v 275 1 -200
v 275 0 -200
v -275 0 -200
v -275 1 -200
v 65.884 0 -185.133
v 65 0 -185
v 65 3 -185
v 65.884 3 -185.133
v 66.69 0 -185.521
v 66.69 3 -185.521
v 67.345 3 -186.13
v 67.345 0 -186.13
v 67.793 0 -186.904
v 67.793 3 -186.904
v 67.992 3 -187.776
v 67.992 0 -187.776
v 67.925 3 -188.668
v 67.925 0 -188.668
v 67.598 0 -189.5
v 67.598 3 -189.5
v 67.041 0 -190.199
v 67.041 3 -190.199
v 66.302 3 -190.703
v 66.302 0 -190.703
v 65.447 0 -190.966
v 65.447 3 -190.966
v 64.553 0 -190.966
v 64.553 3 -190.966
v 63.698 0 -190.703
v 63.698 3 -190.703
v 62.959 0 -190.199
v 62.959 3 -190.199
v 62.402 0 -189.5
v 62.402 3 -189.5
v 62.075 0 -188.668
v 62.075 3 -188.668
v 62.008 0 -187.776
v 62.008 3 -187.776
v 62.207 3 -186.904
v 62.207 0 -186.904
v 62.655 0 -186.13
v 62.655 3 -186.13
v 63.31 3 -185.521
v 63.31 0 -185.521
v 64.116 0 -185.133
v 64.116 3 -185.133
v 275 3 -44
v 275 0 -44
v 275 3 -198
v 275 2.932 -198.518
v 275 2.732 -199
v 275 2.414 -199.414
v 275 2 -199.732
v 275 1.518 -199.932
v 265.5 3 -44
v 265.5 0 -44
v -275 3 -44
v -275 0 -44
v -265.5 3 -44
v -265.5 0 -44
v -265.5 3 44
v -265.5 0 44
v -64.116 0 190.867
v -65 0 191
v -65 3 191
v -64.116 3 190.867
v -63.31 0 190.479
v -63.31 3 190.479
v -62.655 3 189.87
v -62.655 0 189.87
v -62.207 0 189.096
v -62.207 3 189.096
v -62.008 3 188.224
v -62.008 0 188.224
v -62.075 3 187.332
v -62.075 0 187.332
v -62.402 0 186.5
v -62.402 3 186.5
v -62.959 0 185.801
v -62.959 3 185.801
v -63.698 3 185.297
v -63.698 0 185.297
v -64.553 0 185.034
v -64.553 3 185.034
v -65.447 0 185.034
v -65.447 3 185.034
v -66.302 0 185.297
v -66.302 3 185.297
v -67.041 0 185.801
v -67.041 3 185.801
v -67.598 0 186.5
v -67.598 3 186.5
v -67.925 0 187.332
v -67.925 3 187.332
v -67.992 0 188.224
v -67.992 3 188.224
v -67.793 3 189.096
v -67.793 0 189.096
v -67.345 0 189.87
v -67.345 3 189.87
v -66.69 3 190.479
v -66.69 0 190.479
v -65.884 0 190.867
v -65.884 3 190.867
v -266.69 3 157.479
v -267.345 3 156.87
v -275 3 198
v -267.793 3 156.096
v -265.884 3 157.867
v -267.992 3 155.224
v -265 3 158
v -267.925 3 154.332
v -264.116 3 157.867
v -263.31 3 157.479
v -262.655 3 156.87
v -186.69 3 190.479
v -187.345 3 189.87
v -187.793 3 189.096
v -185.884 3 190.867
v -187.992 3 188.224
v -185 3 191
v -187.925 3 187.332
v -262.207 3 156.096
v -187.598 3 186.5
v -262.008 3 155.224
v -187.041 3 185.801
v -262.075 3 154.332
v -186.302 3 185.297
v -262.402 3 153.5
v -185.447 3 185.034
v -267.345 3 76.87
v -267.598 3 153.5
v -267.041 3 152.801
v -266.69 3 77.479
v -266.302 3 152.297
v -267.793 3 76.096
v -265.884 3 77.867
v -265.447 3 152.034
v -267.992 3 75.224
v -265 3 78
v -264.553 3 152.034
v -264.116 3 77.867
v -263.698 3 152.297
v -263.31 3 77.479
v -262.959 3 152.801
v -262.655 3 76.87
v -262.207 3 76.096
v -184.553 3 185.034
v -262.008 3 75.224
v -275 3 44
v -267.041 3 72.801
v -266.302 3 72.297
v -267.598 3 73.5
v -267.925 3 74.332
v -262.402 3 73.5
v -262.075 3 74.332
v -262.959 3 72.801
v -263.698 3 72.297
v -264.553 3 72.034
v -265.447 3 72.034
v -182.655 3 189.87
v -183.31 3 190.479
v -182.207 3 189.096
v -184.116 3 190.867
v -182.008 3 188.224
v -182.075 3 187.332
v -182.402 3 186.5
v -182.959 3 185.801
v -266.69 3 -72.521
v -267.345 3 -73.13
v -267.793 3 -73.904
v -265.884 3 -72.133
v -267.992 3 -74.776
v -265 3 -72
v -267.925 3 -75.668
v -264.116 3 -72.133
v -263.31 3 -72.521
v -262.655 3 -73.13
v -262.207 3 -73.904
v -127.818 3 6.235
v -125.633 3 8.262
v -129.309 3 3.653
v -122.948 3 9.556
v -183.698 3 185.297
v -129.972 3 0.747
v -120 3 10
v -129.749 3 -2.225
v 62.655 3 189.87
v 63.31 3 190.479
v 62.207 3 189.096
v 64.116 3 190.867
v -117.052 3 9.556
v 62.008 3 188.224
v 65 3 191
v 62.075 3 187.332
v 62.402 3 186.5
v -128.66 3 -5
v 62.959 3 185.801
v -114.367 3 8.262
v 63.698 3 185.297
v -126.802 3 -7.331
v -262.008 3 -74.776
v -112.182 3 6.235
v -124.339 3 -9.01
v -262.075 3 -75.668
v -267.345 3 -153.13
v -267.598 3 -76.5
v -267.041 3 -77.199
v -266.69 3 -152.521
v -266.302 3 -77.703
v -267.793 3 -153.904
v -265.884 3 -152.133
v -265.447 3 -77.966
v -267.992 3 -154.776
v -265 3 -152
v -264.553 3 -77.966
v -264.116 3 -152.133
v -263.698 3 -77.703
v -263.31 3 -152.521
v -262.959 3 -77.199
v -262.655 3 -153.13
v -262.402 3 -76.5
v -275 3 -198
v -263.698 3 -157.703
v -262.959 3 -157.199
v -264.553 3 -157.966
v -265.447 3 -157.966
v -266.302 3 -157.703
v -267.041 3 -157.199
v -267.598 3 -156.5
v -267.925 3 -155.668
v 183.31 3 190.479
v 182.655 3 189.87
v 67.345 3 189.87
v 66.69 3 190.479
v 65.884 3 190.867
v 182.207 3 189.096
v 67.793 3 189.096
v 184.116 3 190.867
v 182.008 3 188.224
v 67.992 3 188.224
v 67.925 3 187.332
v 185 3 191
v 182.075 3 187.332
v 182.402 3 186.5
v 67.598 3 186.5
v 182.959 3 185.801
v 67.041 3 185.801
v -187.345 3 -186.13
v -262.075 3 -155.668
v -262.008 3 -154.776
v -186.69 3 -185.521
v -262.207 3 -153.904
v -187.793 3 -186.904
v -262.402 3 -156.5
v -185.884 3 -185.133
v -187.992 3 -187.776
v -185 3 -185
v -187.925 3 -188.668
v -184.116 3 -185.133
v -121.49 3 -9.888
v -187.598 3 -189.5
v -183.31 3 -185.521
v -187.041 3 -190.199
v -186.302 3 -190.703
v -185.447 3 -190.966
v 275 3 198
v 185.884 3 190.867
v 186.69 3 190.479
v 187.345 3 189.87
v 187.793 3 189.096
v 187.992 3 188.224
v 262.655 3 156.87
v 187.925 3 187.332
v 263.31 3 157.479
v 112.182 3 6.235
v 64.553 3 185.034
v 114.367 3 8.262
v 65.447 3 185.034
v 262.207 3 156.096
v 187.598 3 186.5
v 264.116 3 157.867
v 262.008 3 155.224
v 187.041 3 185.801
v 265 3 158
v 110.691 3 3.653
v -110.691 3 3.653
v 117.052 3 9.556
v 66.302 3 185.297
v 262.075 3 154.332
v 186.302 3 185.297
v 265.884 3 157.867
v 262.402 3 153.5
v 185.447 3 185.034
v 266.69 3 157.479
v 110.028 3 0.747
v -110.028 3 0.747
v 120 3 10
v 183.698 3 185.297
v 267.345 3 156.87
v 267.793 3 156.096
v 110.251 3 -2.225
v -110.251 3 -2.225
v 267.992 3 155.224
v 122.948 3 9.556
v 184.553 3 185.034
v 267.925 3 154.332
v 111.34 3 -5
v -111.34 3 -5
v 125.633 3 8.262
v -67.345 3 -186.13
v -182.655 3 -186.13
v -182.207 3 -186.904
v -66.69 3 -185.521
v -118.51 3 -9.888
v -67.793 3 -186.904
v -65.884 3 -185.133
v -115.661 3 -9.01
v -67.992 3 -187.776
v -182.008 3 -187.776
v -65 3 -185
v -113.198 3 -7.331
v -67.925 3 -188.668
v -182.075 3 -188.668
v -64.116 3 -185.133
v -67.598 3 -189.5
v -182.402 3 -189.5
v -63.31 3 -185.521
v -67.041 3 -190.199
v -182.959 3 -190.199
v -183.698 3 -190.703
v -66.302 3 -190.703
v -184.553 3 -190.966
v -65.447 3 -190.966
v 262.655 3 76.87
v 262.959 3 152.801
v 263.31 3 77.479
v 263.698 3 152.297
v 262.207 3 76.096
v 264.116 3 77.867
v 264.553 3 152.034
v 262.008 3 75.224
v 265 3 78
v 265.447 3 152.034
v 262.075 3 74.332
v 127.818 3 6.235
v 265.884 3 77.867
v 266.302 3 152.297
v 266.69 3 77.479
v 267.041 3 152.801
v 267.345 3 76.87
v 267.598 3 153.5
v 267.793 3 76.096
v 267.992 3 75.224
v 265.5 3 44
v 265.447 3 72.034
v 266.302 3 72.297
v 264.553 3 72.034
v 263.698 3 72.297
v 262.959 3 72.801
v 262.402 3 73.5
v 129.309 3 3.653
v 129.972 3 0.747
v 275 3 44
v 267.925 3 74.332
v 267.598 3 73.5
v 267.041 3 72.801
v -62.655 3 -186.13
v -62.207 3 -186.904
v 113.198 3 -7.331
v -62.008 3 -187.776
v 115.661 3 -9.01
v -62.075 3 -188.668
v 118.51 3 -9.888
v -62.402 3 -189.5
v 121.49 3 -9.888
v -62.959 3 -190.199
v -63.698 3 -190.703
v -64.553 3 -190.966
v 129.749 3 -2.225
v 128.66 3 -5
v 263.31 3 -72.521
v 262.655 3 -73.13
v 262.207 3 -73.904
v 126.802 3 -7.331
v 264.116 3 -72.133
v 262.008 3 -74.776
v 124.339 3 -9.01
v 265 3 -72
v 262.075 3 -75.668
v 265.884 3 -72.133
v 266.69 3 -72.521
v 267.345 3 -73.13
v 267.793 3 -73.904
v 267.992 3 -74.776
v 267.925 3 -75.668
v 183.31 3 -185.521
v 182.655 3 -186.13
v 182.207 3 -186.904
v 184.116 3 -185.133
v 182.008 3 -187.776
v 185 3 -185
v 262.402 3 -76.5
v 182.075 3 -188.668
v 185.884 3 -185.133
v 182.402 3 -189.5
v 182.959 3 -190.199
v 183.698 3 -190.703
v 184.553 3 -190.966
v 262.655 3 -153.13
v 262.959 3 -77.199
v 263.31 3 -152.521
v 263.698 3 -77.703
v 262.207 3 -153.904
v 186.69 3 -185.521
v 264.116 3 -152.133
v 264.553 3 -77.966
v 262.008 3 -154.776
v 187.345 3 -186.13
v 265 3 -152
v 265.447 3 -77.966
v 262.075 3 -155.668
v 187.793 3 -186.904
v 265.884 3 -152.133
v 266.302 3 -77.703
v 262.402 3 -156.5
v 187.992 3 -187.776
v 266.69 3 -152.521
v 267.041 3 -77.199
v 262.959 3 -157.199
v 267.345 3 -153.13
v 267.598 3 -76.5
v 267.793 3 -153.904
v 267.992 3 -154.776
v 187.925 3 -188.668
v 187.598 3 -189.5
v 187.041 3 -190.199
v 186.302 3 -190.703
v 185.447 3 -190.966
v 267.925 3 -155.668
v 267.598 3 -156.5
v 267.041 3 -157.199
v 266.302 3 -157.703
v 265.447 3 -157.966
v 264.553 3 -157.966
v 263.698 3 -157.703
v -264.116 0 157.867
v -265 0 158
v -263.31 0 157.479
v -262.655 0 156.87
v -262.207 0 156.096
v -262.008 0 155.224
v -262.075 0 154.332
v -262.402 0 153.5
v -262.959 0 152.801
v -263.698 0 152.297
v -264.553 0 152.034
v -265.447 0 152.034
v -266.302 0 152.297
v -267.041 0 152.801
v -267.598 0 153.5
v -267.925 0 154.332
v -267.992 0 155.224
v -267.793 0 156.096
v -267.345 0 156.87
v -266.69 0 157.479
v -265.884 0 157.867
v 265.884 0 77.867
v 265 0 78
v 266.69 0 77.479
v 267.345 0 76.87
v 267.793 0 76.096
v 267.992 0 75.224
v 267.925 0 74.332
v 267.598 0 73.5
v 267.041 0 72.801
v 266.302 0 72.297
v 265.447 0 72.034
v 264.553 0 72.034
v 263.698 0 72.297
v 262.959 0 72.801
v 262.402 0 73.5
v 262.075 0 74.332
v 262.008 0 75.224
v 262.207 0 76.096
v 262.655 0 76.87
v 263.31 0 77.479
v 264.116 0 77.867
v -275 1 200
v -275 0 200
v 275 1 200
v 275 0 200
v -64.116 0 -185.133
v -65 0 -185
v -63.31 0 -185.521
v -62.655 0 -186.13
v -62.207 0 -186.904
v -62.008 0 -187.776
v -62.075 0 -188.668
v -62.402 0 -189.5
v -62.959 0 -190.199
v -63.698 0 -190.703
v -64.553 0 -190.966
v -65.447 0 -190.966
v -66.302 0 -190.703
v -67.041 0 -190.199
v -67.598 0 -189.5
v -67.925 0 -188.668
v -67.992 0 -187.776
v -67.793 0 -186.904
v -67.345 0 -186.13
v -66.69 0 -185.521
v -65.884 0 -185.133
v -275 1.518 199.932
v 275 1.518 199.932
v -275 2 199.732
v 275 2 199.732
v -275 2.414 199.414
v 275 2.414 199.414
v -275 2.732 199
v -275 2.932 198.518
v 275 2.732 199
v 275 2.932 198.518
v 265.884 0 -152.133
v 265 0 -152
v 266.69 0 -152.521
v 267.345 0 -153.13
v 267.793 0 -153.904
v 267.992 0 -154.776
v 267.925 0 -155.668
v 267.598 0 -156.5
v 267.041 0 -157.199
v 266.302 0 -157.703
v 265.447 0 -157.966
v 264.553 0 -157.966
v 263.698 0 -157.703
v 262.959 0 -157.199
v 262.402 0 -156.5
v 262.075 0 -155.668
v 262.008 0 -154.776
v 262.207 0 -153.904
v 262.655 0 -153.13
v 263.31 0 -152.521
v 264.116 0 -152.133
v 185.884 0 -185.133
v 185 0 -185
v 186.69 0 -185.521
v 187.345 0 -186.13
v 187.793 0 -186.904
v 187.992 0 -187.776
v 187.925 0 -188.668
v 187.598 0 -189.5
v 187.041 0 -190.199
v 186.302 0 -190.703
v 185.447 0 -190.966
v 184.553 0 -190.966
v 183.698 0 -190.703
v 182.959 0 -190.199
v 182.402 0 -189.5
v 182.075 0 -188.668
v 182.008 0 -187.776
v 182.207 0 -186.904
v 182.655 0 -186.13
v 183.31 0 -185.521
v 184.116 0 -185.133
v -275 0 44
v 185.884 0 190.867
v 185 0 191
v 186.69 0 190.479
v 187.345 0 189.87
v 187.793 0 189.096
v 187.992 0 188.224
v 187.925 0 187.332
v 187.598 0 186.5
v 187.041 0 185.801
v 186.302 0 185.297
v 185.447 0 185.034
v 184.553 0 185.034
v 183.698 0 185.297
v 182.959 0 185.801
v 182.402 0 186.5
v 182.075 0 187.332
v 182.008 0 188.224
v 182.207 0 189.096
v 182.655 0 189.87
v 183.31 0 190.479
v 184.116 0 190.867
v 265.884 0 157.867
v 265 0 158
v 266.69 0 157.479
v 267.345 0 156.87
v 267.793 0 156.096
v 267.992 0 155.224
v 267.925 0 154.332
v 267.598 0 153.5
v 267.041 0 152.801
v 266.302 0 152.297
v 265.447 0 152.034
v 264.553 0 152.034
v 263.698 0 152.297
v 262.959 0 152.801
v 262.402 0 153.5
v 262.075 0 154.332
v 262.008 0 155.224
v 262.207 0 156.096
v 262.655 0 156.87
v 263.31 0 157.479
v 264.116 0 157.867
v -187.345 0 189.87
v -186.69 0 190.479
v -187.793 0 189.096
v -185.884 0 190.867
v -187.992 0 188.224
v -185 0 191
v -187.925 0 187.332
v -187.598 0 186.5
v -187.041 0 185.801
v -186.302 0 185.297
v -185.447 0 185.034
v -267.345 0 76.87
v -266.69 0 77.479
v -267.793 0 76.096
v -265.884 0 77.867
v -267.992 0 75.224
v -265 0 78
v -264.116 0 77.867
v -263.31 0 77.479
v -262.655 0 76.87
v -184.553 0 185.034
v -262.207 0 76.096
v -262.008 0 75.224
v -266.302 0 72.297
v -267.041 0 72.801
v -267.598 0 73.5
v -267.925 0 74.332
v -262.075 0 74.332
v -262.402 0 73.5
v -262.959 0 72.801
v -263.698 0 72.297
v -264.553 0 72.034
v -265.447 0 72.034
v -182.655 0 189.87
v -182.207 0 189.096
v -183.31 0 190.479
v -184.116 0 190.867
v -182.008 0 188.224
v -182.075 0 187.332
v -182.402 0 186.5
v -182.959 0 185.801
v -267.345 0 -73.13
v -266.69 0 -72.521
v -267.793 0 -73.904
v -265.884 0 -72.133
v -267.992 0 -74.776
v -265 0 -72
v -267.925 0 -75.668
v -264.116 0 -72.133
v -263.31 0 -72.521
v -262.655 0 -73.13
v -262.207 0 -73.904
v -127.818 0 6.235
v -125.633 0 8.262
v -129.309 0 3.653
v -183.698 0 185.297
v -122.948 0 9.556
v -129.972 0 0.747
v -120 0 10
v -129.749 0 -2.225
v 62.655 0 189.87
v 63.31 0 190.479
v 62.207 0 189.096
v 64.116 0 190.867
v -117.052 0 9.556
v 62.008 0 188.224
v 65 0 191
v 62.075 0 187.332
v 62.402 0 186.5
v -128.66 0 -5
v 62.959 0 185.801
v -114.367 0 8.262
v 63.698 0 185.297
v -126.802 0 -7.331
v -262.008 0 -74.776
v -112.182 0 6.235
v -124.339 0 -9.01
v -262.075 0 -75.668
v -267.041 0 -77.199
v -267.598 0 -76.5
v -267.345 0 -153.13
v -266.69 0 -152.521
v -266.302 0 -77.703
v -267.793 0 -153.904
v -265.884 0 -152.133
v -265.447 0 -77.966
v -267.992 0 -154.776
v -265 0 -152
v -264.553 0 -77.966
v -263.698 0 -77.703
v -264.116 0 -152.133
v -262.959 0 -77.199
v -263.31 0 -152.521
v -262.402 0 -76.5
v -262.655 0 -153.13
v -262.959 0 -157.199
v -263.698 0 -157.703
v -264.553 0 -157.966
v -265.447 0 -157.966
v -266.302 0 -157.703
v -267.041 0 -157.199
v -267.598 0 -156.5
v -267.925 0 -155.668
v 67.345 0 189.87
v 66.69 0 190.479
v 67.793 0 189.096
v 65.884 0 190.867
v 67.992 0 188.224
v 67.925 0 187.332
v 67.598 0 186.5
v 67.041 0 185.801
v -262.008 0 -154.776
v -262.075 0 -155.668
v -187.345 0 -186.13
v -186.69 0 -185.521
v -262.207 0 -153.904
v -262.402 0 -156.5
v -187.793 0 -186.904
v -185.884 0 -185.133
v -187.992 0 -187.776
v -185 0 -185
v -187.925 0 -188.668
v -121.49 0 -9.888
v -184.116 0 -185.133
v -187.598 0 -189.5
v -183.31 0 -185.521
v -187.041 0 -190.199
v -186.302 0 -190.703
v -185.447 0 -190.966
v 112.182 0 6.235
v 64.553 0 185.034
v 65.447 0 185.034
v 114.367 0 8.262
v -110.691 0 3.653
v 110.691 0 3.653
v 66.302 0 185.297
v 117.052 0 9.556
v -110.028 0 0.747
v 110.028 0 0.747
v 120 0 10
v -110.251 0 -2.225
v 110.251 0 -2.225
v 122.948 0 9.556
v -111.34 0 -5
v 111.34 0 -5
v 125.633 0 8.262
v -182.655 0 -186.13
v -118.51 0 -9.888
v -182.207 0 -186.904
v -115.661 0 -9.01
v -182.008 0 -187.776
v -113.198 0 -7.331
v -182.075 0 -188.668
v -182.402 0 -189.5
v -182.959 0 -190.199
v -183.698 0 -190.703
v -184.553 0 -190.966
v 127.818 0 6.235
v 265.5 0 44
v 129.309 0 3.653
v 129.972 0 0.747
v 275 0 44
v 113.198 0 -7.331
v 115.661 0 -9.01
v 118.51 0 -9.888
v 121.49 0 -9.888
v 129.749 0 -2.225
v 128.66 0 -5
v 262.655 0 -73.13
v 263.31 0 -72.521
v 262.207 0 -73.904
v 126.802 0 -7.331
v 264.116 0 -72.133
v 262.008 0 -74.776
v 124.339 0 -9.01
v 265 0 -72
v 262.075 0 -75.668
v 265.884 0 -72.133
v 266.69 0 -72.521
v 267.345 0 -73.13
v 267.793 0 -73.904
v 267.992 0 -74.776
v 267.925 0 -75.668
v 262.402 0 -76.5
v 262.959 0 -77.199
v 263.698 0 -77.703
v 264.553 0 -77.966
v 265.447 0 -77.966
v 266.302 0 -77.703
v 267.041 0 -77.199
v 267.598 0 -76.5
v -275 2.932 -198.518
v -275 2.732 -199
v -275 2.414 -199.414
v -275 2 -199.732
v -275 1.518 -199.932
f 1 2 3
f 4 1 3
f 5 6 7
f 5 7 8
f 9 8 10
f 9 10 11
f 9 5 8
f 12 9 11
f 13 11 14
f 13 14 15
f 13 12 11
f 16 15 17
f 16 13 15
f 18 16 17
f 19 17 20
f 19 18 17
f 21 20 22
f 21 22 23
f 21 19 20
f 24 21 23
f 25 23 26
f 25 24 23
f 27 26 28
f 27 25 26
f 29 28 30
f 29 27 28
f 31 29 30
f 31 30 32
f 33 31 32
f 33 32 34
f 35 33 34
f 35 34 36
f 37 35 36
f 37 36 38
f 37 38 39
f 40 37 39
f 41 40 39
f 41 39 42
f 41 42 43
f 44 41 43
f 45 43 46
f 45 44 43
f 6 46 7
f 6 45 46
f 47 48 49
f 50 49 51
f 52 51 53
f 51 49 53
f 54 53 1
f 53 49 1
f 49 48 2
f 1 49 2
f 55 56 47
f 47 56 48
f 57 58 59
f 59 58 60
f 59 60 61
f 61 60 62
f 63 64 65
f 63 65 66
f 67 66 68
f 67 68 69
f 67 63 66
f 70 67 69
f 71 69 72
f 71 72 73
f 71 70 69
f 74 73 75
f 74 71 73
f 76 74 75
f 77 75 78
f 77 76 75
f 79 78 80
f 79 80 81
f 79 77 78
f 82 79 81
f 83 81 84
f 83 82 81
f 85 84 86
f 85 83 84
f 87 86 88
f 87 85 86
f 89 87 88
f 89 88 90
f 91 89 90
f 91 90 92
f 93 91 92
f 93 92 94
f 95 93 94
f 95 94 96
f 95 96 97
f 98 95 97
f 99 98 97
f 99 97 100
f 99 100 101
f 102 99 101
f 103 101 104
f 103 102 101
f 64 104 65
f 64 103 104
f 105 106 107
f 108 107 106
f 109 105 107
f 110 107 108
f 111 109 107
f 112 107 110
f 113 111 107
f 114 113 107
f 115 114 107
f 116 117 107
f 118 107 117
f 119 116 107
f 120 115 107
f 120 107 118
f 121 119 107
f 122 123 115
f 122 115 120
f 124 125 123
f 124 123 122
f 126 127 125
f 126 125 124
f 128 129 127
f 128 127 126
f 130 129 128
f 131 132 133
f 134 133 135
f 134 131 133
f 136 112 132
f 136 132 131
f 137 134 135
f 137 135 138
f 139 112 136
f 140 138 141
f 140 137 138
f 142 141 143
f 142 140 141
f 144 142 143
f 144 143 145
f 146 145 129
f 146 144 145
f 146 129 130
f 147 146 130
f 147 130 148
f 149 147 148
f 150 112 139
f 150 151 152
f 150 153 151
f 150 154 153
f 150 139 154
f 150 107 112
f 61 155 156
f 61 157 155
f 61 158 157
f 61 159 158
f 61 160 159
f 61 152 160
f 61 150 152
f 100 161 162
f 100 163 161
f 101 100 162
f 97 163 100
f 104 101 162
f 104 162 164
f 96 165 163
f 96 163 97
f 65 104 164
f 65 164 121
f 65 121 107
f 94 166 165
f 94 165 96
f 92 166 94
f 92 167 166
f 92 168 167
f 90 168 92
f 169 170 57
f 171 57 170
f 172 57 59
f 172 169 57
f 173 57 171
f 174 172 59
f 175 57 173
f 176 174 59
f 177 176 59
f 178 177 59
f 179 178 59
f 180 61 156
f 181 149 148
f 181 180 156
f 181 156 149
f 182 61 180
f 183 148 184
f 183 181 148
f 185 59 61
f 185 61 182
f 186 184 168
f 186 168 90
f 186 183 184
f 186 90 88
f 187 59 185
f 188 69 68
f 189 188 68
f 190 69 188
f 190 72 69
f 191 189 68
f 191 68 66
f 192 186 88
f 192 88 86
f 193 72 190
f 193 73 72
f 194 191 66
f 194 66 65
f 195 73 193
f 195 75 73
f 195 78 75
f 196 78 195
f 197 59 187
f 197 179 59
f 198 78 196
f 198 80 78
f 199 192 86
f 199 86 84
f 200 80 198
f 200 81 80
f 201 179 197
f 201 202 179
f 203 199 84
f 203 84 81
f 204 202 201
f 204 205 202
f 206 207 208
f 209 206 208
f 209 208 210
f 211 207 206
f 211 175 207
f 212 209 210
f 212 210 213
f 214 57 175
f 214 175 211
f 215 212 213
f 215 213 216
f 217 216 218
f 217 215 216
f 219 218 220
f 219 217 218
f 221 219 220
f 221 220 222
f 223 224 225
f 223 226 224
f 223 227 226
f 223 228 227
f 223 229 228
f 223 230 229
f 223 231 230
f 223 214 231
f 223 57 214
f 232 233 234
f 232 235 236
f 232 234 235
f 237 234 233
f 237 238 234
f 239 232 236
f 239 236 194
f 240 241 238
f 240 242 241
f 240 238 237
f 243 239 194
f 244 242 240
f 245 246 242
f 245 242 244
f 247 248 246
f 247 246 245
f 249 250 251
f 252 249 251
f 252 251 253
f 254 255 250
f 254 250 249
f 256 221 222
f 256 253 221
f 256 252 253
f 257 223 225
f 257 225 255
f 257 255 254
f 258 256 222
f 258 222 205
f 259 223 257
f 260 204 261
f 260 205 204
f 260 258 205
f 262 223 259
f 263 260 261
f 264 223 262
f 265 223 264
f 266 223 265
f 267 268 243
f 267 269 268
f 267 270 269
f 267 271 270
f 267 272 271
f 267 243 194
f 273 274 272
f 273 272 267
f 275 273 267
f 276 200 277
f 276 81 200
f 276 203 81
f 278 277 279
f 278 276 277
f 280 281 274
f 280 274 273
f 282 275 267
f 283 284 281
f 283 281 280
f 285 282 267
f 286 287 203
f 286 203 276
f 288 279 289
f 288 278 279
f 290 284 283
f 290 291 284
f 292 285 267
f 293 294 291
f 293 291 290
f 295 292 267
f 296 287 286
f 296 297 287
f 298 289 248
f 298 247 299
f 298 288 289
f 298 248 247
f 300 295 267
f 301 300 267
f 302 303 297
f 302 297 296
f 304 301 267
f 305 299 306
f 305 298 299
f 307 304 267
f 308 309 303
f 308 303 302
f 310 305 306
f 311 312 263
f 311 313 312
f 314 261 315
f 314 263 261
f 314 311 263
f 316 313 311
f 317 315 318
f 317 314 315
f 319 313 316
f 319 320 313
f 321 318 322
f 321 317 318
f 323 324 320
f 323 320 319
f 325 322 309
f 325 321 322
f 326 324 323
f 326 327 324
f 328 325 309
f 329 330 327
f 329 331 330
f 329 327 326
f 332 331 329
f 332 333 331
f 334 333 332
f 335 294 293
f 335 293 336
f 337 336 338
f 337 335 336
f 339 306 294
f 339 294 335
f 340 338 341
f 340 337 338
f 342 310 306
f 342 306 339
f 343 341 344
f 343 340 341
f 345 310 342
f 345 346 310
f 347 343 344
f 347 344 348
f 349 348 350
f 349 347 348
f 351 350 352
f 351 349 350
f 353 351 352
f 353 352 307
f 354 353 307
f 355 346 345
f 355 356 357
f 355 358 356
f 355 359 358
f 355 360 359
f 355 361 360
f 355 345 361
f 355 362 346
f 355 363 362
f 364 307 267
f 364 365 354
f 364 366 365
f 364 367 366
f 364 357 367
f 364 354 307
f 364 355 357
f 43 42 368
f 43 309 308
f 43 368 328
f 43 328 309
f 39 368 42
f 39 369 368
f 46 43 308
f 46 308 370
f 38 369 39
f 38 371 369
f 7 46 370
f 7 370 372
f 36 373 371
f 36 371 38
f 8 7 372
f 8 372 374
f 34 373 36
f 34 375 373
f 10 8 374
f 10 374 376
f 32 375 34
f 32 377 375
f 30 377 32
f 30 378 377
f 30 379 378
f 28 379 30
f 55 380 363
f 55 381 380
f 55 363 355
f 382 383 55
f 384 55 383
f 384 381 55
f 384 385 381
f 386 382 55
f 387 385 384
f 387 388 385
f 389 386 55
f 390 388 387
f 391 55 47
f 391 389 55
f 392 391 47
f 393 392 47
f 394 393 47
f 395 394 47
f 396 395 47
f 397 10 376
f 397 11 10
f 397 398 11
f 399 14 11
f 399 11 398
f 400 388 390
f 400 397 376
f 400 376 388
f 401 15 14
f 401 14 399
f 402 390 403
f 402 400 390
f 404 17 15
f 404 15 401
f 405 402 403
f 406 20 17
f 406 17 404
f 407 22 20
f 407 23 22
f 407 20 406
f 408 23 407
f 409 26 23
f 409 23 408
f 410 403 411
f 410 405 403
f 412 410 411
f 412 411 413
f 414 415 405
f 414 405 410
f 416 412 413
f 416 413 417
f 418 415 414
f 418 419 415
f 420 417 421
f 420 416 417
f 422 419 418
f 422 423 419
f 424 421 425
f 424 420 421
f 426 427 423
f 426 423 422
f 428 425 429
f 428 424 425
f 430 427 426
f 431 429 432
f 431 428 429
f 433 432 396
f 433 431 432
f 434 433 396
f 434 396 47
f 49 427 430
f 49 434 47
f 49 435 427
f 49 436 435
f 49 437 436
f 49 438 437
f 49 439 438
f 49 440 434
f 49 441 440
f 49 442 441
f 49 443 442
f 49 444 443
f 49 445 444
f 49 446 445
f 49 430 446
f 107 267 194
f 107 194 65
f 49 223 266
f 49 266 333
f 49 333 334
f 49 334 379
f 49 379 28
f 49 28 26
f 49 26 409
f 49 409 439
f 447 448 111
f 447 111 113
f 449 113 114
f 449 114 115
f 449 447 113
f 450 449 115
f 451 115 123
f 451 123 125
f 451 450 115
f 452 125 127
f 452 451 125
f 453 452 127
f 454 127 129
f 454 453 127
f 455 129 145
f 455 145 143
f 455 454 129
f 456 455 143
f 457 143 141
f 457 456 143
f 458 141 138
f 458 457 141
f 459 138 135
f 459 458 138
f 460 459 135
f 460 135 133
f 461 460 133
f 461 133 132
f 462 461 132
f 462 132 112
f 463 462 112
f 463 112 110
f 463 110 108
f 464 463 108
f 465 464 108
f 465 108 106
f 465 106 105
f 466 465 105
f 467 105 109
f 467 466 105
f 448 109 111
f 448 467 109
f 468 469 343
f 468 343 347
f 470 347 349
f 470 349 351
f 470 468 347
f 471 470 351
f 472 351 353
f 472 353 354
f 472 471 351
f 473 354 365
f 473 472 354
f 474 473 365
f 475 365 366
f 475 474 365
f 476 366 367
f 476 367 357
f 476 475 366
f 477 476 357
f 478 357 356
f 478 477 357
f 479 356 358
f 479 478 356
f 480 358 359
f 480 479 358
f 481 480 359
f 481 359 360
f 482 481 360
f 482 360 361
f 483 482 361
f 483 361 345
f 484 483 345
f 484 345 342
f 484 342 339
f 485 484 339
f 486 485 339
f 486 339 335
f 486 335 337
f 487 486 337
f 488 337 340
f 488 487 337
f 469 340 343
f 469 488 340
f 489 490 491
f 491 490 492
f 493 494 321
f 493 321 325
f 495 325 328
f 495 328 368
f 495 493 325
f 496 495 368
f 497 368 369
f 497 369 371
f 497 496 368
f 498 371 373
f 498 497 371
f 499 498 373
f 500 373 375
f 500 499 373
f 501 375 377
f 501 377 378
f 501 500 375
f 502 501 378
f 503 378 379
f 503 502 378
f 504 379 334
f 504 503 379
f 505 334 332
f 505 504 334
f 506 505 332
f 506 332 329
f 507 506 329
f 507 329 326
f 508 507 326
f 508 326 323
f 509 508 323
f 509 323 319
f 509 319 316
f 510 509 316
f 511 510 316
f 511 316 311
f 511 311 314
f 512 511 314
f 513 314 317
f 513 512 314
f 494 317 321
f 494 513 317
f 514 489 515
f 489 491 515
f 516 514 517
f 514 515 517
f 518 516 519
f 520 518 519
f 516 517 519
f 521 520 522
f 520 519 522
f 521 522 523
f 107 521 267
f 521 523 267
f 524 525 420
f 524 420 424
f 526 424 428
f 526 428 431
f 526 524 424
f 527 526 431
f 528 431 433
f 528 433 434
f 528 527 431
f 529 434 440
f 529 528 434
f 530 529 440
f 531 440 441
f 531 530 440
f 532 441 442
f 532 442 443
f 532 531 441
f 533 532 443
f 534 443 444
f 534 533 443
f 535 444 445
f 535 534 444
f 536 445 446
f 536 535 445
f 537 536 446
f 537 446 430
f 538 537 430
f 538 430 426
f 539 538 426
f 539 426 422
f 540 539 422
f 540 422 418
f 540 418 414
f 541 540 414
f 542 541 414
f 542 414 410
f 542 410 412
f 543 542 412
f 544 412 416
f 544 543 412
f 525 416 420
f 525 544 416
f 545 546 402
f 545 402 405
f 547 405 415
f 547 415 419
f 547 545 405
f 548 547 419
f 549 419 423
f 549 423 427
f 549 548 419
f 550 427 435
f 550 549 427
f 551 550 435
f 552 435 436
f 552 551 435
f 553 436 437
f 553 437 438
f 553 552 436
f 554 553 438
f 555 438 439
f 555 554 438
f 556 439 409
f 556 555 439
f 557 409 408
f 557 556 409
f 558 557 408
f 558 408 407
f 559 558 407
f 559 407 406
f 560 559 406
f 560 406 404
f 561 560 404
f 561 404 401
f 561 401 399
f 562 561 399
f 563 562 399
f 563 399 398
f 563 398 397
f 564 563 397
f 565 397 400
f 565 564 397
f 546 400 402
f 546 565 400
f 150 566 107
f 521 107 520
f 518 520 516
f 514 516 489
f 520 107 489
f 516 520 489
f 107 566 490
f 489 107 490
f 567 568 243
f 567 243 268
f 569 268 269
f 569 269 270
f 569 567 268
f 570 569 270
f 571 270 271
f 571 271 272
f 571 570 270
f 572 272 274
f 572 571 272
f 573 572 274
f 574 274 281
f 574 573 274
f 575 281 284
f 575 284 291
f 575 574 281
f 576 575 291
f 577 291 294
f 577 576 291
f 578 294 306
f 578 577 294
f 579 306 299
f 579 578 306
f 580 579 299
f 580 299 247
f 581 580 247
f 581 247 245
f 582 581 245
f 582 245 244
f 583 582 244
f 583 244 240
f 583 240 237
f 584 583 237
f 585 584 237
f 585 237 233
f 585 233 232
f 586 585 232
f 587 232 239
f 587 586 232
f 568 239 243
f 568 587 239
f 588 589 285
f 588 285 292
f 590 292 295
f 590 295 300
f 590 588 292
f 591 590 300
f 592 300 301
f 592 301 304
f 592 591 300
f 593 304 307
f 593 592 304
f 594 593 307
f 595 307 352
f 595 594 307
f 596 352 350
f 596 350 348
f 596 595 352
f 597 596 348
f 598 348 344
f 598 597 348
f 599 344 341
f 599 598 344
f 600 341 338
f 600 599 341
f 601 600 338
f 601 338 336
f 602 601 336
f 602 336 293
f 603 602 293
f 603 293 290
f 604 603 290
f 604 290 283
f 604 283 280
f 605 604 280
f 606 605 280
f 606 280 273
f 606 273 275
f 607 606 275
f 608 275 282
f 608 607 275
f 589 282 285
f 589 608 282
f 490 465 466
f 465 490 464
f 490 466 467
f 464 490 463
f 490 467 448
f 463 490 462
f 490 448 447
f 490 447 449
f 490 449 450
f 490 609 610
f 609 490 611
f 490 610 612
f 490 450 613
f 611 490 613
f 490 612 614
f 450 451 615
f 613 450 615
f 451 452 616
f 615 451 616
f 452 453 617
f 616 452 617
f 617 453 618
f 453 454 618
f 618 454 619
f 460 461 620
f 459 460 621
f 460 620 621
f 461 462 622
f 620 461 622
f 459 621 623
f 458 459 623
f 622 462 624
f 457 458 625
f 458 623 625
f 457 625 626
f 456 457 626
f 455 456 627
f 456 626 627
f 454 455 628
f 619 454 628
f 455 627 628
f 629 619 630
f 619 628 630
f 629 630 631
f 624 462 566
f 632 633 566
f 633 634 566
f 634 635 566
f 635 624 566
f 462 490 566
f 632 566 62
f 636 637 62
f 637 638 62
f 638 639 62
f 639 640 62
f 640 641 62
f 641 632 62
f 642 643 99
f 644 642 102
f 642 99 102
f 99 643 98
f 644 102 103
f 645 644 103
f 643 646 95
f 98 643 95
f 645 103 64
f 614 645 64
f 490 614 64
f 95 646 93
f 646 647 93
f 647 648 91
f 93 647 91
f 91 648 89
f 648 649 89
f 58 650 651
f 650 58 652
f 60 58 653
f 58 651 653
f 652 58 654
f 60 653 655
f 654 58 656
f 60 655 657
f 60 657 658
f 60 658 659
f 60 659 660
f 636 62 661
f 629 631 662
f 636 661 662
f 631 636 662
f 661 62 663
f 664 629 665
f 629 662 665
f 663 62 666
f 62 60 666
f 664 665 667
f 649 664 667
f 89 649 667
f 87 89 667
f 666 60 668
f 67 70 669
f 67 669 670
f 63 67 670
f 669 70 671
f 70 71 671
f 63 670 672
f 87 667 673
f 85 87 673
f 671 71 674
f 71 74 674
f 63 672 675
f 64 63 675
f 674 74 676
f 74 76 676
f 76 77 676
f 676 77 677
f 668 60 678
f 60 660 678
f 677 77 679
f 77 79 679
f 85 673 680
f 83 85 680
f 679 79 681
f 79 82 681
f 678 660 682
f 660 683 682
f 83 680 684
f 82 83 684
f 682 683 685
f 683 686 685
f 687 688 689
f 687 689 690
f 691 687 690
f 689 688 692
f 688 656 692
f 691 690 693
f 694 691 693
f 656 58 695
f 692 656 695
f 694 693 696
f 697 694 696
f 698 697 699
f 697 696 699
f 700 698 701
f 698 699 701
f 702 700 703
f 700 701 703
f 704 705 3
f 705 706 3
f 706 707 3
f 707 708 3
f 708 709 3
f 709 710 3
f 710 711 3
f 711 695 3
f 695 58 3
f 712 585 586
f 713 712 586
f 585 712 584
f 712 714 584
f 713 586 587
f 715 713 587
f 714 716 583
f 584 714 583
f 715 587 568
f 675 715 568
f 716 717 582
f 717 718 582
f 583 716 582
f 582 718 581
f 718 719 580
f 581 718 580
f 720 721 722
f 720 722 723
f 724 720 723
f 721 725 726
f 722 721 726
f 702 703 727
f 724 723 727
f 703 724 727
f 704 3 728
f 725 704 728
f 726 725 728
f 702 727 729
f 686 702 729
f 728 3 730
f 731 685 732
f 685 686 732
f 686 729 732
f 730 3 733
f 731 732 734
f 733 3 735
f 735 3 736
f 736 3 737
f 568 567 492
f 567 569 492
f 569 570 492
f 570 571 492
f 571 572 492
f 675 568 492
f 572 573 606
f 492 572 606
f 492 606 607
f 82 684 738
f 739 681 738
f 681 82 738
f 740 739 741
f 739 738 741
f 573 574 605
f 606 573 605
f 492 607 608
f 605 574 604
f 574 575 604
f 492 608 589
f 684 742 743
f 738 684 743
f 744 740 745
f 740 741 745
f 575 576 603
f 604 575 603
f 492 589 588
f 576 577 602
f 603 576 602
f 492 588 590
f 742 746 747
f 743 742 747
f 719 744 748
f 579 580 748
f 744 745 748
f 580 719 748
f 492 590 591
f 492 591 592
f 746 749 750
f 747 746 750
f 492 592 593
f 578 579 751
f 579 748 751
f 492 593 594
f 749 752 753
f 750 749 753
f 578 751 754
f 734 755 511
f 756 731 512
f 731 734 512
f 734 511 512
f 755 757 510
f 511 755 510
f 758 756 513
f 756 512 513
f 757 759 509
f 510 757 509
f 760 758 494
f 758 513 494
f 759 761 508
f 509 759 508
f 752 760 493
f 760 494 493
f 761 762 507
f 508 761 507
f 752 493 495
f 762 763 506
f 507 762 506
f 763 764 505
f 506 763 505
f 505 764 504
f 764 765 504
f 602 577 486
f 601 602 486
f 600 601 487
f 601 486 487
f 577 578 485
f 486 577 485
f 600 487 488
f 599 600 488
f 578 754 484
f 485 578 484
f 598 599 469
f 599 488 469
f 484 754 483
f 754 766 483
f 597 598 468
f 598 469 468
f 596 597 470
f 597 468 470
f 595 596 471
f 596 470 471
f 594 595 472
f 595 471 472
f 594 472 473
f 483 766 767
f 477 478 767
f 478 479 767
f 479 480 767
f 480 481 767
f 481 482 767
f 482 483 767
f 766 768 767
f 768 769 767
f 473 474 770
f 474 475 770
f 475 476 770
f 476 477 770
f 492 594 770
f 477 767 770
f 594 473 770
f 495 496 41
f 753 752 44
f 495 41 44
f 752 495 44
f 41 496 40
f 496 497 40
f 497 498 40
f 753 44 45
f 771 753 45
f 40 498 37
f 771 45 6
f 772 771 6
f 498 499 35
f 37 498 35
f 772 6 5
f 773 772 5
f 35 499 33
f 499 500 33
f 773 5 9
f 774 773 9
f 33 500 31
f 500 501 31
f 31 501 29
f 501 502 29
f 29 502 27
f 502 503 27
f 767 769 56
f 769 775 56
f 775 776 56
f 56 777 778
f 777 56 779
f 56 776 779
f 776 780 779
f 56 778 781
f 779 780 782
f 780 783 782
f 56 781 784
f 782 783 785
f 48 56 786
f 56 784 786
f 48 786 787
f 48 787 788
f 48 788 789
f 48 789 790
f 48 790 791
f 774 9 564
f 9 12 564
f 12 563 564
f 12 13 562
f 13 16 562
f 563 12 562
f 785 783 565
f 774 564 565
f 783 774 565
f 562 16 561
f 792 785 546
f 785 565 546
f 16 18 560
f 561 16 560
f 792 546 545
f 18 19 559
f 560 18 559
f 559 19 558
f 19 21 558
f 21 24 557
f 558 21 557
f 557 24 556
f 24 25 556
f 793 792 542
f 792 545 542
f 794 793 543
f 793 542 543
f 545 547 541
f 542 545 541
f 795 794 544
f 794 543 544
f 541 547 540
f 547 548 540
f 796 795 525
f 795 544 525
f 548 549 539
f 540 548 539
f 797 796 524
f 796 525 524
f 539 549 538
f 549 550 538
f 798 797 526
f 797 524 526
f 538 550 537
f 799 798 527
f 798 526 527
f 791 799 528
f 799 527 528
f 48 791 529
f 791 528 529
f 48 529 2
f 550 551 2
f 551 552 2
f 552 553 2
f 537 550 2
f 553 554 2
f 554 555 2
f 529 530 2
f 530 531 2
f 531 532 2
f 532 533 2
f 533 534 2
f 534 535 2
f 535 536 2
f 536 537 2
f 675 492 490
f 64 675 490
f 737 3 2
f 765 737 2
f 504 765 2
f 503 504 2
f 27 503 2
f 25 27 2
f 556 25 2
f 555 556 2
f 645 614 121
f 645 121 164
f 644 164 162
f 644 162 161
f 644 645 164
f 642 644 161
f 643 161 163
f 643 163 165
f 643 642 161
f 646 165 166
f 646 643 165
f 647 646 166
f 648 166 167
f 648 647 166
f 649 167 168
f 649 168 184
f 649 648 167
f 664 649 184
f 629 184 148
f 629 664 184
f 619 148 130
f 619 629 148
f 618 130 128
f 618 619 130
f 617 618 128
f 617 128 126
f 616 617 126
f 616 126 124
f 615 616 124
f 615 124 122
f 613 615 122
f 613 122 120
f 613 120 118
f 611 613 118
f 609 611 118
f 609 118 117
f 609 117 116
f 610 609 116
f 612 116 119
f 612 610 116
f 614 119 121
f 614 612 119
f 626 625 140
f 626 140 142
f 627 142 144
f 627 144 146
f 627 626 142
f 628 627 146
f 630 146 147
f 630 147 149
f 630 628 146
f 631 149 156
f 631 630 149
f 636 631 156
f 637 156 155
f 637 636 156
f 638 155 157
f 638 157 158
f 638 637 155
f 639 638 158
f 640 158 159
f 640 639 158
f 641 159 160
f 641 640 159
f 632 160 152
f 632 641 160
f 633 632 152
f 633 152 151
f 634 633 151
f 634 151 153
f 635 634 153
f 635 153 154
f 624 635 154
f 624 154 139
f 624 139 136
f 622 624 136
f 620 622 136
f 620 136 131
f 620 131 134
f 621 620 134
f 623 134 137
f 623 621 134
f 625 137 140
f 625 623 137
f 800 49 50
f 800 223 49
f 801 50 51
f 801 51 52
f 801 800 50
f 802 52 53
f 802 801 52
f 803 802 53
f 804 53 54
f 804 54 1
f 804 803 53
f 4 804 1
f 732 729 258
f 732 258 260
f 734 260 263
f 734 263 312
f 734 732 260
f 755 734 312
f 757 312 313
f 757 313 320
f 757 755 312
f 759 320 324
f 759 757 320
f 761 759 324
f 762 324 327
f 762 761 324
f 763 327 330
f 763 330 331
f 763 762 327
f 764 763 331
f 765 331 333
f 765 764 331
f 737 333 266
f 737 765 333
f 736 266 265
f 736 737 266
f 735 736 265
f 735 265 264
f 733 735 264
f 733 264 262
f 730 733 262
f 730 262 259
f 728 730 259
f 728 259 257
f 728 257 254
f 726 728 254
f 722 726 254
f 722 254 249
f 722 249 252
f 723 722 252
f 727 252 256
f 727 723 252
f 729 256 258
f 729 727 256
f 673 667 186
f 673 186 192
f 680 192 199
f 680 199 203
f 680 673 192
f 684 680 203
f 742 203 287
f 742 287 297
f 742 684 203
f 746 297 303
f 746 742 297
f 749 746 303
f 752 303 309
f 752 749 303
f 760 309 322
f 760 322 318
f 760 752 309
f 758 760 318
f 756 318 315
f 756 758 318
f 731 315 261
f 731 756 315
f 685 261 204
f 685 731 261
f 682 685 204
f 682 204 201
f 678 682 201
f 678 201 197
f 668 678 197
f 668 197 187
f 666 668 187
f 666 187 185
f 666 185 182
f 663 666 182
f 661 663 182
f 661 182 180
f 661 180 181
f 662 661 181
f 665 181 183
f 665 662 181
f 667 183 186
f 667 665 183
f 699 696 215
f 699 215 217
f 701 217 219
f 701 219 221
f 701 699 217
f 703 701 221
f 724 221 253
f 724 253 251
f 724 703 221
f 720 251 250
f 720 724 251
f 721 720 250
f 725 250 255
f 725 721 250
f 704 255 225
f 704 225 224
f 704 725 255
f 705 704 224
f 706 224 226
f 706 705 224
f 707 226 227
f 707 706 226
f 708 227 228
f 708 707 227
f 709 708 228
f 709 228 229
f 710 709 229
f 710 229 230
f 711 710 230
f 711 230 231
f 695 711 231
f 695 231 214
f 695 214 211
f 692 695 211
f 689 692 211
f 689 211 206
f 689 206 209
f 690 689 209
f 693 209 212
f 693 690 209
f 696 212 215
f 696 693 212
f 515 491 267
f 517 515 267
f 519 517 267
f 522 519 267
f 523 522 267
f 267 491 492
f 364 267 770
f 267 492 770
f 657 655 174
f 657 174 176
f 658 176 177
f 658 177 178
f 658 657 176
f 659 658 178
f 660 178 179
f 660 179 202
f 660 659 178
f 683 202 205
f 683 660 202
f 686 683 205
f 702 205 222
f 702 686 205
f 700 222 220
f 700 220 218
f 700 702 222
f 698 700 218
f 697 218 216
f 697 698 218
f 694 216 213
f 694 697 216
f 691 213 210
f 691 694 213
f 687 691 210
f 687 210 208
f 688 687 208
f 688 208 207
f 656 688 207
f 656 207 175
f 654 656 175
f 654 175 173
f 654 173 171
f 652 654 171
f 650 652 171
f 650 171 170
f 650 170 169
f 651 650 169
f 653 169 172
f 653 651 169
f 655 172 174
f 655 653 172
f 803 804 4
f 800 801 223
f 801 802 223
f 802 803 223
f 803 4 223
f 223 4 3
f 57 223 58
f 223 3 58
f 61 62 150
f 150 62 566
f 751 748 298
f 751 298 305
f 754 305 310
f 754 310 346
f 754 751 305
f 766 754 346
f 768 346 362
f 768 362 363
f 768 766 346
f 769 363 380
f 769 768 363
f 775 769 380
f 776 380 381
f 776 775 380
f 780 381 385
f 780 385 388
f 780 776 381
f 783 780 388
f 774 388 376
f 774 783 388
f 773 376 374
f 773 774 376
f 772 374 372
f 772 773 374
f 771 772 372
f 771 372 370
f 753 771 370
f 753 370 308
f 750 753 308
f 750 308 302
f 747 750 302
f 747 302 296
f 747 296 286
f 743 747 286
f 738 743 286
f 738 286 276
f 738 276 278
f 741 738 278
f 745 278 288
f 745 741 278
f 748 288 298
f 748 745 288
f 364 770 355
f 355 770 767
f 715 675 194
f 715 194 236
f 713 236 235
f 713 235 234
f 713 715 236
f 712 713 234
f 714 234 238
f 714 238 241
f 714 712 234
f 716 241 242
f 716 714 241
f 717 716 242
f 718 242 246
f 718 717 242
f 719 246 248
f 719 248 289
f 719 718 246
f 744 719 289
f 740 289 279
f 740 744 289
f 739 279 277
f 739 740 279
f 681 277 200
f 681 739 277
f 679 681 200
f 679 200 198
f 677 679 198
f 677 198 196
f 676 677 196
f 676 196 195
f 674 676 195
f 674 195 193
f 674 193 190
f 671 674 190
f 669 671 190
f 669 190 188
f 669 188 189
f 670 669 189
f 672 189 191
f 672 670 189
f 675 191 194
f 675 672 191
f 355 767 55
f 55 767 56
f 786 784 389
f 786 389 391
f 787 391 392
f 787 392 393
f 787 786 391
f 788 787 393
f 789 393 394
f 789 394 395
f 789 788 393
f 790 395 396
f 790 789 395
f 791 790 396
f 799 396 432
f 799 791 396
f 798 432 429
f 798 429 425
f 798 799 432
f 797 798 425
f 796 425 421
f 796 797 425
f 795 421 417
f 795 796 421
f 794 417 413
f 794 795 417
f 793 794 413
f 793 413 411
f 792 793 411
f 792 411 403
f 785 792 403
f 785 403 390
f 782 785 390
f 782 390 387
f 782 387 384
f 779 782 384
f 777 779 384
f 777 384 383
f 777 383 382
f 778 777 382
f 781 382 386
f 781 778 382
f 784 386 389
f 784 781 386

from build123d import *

# Parameters (mm, degrees)
SKETCH_1_R      = 3
SKETCH_1_R_2    = 10
EXTRUDE_1_DEPTH = 3
FILLET_1_R      = 2
FILLET_2_R      = 2


with BuildPart() as part:
    # 草图1 → 凸台-拉伸1 (new body)
    with BuildSketch(Plane(origin=(0, 0, 0), x_dir=(1, 0, 0), z_dir=(0, 1, 0))):
        Polygon((-275, -200), (275, -200), (275, -44), (265.5, -44), (265.5, 44), (275, 44), (275, 200), (-275, 200), (-275, 44), (-265.5, 44), (-265.5, -44), (-275, -44), align=None)
        with Locations(Location((-265, -75, 0), (0, 0, 270))):
            Circle(SKETCH_1_R, mode=Mode.SUBTRACT)
        with Locations(Location((-265, -155, 0), (0, 0, 270))):
            Circle(SKETCH_1_R, mode=Mode.SUBTRACT)
        with Locations(Location((-185, -188, 0), (0, 0, 270))):
            Circle(SKETCH_1_R, mode=Mode.SUBTRACT)
        with Locations(Location((-65, -188, 0), (0, 0, 270))):
            Circle(SKETCH_1_R, mode=Mode.SUBTRACT)
        with Locations(Location((-65, 188, 0), (0, 0, 270))):
            Circle(SKETCH_1_R, mode=Mode.SUBTRACT)
        with Locations(Location((-185, 188, 0), (0, 0, 270))):
            Circle(SKETCH_1_R, mode=Mode.SUBTRACT)
        with Locations(Location((-265, 155, 0), (0, 0, 270))):
            Circle(SKETCH_1_R, mode=Mode.SUBTRACT)
        with Locations(Location((-265, 75, 0), (0, 0, 270))):
            Circle(SKETCH_1_R, mode=Mode.SUBTRACT)
        with Locations(Location((265, 75, 0), (0, 0, 270))):
            Circle(SKETCH_1_R, mode=Mode.SUBTRACT)
        with Locations(Location((265, 155, 0), (0, 0, 270))):
            Circle(SKETCH_1_R, mode=Mode.SUBTRACT)
        with Locations(Location((185, 188, 0), (0, 0, 270))):
            Circle(SKETCH_1_R, mode=Mode.SUBTRACT)
        with Locations(Location((65, 188, 0), (0, 0, 270))):
            Circle(SKETCH_1_R, mode=Mode.SUBTRACT)
        with Locations(Location((65, -188, 0), (0, 0, 270))):
            Circle(SKETCH_1_R, mode=Mode.SUBTRACT)
        with Locations(Location((185, -188, 0), (0, 0, 270))):
            Circle(SKETCH_1_R, mode=Mode.SUBTRACT)
        with Locations(Location((265, -155, 0), (0, 0, 270))):
            Circle(SKETCH_1_R, mode=Mode.SUBTRACT)
        with Locations(Location((265, -75, 0), (0, 0, 270))):
            Circle(SKETCH_1_R, mode=Mode.SUBTRACT)
        with Locations(Location((-120, 0, 0), (0, 0, 270))):
            Circle(SKETCH_1_R_2, mode=Mode.SUBTRACT)
        with Locations(Location((120, 0, 0), (0, 0, 270))):
            Circle(SKETCH_1_R_2, mode=Mode.SUBTRACT)
    extrude(amount=EXTRUDE_1_DEPTH)

    # 圆角1
    fillet_1_edges = [part.edges().sort_by_distance(p)[0] for p in [
        (0, 3, 200),
    ]]
    fillet(fillet_1_edges, radius=FILLET_1_R)

    # 圆角2
    fillet_2_edges = [part.edges().sort_by_distance(p)[0] for p in [
        (0, 3, -200),
    ]]
    fillet(fillet_2_edges, radius=FILLET_2_R)


solid = part.part
